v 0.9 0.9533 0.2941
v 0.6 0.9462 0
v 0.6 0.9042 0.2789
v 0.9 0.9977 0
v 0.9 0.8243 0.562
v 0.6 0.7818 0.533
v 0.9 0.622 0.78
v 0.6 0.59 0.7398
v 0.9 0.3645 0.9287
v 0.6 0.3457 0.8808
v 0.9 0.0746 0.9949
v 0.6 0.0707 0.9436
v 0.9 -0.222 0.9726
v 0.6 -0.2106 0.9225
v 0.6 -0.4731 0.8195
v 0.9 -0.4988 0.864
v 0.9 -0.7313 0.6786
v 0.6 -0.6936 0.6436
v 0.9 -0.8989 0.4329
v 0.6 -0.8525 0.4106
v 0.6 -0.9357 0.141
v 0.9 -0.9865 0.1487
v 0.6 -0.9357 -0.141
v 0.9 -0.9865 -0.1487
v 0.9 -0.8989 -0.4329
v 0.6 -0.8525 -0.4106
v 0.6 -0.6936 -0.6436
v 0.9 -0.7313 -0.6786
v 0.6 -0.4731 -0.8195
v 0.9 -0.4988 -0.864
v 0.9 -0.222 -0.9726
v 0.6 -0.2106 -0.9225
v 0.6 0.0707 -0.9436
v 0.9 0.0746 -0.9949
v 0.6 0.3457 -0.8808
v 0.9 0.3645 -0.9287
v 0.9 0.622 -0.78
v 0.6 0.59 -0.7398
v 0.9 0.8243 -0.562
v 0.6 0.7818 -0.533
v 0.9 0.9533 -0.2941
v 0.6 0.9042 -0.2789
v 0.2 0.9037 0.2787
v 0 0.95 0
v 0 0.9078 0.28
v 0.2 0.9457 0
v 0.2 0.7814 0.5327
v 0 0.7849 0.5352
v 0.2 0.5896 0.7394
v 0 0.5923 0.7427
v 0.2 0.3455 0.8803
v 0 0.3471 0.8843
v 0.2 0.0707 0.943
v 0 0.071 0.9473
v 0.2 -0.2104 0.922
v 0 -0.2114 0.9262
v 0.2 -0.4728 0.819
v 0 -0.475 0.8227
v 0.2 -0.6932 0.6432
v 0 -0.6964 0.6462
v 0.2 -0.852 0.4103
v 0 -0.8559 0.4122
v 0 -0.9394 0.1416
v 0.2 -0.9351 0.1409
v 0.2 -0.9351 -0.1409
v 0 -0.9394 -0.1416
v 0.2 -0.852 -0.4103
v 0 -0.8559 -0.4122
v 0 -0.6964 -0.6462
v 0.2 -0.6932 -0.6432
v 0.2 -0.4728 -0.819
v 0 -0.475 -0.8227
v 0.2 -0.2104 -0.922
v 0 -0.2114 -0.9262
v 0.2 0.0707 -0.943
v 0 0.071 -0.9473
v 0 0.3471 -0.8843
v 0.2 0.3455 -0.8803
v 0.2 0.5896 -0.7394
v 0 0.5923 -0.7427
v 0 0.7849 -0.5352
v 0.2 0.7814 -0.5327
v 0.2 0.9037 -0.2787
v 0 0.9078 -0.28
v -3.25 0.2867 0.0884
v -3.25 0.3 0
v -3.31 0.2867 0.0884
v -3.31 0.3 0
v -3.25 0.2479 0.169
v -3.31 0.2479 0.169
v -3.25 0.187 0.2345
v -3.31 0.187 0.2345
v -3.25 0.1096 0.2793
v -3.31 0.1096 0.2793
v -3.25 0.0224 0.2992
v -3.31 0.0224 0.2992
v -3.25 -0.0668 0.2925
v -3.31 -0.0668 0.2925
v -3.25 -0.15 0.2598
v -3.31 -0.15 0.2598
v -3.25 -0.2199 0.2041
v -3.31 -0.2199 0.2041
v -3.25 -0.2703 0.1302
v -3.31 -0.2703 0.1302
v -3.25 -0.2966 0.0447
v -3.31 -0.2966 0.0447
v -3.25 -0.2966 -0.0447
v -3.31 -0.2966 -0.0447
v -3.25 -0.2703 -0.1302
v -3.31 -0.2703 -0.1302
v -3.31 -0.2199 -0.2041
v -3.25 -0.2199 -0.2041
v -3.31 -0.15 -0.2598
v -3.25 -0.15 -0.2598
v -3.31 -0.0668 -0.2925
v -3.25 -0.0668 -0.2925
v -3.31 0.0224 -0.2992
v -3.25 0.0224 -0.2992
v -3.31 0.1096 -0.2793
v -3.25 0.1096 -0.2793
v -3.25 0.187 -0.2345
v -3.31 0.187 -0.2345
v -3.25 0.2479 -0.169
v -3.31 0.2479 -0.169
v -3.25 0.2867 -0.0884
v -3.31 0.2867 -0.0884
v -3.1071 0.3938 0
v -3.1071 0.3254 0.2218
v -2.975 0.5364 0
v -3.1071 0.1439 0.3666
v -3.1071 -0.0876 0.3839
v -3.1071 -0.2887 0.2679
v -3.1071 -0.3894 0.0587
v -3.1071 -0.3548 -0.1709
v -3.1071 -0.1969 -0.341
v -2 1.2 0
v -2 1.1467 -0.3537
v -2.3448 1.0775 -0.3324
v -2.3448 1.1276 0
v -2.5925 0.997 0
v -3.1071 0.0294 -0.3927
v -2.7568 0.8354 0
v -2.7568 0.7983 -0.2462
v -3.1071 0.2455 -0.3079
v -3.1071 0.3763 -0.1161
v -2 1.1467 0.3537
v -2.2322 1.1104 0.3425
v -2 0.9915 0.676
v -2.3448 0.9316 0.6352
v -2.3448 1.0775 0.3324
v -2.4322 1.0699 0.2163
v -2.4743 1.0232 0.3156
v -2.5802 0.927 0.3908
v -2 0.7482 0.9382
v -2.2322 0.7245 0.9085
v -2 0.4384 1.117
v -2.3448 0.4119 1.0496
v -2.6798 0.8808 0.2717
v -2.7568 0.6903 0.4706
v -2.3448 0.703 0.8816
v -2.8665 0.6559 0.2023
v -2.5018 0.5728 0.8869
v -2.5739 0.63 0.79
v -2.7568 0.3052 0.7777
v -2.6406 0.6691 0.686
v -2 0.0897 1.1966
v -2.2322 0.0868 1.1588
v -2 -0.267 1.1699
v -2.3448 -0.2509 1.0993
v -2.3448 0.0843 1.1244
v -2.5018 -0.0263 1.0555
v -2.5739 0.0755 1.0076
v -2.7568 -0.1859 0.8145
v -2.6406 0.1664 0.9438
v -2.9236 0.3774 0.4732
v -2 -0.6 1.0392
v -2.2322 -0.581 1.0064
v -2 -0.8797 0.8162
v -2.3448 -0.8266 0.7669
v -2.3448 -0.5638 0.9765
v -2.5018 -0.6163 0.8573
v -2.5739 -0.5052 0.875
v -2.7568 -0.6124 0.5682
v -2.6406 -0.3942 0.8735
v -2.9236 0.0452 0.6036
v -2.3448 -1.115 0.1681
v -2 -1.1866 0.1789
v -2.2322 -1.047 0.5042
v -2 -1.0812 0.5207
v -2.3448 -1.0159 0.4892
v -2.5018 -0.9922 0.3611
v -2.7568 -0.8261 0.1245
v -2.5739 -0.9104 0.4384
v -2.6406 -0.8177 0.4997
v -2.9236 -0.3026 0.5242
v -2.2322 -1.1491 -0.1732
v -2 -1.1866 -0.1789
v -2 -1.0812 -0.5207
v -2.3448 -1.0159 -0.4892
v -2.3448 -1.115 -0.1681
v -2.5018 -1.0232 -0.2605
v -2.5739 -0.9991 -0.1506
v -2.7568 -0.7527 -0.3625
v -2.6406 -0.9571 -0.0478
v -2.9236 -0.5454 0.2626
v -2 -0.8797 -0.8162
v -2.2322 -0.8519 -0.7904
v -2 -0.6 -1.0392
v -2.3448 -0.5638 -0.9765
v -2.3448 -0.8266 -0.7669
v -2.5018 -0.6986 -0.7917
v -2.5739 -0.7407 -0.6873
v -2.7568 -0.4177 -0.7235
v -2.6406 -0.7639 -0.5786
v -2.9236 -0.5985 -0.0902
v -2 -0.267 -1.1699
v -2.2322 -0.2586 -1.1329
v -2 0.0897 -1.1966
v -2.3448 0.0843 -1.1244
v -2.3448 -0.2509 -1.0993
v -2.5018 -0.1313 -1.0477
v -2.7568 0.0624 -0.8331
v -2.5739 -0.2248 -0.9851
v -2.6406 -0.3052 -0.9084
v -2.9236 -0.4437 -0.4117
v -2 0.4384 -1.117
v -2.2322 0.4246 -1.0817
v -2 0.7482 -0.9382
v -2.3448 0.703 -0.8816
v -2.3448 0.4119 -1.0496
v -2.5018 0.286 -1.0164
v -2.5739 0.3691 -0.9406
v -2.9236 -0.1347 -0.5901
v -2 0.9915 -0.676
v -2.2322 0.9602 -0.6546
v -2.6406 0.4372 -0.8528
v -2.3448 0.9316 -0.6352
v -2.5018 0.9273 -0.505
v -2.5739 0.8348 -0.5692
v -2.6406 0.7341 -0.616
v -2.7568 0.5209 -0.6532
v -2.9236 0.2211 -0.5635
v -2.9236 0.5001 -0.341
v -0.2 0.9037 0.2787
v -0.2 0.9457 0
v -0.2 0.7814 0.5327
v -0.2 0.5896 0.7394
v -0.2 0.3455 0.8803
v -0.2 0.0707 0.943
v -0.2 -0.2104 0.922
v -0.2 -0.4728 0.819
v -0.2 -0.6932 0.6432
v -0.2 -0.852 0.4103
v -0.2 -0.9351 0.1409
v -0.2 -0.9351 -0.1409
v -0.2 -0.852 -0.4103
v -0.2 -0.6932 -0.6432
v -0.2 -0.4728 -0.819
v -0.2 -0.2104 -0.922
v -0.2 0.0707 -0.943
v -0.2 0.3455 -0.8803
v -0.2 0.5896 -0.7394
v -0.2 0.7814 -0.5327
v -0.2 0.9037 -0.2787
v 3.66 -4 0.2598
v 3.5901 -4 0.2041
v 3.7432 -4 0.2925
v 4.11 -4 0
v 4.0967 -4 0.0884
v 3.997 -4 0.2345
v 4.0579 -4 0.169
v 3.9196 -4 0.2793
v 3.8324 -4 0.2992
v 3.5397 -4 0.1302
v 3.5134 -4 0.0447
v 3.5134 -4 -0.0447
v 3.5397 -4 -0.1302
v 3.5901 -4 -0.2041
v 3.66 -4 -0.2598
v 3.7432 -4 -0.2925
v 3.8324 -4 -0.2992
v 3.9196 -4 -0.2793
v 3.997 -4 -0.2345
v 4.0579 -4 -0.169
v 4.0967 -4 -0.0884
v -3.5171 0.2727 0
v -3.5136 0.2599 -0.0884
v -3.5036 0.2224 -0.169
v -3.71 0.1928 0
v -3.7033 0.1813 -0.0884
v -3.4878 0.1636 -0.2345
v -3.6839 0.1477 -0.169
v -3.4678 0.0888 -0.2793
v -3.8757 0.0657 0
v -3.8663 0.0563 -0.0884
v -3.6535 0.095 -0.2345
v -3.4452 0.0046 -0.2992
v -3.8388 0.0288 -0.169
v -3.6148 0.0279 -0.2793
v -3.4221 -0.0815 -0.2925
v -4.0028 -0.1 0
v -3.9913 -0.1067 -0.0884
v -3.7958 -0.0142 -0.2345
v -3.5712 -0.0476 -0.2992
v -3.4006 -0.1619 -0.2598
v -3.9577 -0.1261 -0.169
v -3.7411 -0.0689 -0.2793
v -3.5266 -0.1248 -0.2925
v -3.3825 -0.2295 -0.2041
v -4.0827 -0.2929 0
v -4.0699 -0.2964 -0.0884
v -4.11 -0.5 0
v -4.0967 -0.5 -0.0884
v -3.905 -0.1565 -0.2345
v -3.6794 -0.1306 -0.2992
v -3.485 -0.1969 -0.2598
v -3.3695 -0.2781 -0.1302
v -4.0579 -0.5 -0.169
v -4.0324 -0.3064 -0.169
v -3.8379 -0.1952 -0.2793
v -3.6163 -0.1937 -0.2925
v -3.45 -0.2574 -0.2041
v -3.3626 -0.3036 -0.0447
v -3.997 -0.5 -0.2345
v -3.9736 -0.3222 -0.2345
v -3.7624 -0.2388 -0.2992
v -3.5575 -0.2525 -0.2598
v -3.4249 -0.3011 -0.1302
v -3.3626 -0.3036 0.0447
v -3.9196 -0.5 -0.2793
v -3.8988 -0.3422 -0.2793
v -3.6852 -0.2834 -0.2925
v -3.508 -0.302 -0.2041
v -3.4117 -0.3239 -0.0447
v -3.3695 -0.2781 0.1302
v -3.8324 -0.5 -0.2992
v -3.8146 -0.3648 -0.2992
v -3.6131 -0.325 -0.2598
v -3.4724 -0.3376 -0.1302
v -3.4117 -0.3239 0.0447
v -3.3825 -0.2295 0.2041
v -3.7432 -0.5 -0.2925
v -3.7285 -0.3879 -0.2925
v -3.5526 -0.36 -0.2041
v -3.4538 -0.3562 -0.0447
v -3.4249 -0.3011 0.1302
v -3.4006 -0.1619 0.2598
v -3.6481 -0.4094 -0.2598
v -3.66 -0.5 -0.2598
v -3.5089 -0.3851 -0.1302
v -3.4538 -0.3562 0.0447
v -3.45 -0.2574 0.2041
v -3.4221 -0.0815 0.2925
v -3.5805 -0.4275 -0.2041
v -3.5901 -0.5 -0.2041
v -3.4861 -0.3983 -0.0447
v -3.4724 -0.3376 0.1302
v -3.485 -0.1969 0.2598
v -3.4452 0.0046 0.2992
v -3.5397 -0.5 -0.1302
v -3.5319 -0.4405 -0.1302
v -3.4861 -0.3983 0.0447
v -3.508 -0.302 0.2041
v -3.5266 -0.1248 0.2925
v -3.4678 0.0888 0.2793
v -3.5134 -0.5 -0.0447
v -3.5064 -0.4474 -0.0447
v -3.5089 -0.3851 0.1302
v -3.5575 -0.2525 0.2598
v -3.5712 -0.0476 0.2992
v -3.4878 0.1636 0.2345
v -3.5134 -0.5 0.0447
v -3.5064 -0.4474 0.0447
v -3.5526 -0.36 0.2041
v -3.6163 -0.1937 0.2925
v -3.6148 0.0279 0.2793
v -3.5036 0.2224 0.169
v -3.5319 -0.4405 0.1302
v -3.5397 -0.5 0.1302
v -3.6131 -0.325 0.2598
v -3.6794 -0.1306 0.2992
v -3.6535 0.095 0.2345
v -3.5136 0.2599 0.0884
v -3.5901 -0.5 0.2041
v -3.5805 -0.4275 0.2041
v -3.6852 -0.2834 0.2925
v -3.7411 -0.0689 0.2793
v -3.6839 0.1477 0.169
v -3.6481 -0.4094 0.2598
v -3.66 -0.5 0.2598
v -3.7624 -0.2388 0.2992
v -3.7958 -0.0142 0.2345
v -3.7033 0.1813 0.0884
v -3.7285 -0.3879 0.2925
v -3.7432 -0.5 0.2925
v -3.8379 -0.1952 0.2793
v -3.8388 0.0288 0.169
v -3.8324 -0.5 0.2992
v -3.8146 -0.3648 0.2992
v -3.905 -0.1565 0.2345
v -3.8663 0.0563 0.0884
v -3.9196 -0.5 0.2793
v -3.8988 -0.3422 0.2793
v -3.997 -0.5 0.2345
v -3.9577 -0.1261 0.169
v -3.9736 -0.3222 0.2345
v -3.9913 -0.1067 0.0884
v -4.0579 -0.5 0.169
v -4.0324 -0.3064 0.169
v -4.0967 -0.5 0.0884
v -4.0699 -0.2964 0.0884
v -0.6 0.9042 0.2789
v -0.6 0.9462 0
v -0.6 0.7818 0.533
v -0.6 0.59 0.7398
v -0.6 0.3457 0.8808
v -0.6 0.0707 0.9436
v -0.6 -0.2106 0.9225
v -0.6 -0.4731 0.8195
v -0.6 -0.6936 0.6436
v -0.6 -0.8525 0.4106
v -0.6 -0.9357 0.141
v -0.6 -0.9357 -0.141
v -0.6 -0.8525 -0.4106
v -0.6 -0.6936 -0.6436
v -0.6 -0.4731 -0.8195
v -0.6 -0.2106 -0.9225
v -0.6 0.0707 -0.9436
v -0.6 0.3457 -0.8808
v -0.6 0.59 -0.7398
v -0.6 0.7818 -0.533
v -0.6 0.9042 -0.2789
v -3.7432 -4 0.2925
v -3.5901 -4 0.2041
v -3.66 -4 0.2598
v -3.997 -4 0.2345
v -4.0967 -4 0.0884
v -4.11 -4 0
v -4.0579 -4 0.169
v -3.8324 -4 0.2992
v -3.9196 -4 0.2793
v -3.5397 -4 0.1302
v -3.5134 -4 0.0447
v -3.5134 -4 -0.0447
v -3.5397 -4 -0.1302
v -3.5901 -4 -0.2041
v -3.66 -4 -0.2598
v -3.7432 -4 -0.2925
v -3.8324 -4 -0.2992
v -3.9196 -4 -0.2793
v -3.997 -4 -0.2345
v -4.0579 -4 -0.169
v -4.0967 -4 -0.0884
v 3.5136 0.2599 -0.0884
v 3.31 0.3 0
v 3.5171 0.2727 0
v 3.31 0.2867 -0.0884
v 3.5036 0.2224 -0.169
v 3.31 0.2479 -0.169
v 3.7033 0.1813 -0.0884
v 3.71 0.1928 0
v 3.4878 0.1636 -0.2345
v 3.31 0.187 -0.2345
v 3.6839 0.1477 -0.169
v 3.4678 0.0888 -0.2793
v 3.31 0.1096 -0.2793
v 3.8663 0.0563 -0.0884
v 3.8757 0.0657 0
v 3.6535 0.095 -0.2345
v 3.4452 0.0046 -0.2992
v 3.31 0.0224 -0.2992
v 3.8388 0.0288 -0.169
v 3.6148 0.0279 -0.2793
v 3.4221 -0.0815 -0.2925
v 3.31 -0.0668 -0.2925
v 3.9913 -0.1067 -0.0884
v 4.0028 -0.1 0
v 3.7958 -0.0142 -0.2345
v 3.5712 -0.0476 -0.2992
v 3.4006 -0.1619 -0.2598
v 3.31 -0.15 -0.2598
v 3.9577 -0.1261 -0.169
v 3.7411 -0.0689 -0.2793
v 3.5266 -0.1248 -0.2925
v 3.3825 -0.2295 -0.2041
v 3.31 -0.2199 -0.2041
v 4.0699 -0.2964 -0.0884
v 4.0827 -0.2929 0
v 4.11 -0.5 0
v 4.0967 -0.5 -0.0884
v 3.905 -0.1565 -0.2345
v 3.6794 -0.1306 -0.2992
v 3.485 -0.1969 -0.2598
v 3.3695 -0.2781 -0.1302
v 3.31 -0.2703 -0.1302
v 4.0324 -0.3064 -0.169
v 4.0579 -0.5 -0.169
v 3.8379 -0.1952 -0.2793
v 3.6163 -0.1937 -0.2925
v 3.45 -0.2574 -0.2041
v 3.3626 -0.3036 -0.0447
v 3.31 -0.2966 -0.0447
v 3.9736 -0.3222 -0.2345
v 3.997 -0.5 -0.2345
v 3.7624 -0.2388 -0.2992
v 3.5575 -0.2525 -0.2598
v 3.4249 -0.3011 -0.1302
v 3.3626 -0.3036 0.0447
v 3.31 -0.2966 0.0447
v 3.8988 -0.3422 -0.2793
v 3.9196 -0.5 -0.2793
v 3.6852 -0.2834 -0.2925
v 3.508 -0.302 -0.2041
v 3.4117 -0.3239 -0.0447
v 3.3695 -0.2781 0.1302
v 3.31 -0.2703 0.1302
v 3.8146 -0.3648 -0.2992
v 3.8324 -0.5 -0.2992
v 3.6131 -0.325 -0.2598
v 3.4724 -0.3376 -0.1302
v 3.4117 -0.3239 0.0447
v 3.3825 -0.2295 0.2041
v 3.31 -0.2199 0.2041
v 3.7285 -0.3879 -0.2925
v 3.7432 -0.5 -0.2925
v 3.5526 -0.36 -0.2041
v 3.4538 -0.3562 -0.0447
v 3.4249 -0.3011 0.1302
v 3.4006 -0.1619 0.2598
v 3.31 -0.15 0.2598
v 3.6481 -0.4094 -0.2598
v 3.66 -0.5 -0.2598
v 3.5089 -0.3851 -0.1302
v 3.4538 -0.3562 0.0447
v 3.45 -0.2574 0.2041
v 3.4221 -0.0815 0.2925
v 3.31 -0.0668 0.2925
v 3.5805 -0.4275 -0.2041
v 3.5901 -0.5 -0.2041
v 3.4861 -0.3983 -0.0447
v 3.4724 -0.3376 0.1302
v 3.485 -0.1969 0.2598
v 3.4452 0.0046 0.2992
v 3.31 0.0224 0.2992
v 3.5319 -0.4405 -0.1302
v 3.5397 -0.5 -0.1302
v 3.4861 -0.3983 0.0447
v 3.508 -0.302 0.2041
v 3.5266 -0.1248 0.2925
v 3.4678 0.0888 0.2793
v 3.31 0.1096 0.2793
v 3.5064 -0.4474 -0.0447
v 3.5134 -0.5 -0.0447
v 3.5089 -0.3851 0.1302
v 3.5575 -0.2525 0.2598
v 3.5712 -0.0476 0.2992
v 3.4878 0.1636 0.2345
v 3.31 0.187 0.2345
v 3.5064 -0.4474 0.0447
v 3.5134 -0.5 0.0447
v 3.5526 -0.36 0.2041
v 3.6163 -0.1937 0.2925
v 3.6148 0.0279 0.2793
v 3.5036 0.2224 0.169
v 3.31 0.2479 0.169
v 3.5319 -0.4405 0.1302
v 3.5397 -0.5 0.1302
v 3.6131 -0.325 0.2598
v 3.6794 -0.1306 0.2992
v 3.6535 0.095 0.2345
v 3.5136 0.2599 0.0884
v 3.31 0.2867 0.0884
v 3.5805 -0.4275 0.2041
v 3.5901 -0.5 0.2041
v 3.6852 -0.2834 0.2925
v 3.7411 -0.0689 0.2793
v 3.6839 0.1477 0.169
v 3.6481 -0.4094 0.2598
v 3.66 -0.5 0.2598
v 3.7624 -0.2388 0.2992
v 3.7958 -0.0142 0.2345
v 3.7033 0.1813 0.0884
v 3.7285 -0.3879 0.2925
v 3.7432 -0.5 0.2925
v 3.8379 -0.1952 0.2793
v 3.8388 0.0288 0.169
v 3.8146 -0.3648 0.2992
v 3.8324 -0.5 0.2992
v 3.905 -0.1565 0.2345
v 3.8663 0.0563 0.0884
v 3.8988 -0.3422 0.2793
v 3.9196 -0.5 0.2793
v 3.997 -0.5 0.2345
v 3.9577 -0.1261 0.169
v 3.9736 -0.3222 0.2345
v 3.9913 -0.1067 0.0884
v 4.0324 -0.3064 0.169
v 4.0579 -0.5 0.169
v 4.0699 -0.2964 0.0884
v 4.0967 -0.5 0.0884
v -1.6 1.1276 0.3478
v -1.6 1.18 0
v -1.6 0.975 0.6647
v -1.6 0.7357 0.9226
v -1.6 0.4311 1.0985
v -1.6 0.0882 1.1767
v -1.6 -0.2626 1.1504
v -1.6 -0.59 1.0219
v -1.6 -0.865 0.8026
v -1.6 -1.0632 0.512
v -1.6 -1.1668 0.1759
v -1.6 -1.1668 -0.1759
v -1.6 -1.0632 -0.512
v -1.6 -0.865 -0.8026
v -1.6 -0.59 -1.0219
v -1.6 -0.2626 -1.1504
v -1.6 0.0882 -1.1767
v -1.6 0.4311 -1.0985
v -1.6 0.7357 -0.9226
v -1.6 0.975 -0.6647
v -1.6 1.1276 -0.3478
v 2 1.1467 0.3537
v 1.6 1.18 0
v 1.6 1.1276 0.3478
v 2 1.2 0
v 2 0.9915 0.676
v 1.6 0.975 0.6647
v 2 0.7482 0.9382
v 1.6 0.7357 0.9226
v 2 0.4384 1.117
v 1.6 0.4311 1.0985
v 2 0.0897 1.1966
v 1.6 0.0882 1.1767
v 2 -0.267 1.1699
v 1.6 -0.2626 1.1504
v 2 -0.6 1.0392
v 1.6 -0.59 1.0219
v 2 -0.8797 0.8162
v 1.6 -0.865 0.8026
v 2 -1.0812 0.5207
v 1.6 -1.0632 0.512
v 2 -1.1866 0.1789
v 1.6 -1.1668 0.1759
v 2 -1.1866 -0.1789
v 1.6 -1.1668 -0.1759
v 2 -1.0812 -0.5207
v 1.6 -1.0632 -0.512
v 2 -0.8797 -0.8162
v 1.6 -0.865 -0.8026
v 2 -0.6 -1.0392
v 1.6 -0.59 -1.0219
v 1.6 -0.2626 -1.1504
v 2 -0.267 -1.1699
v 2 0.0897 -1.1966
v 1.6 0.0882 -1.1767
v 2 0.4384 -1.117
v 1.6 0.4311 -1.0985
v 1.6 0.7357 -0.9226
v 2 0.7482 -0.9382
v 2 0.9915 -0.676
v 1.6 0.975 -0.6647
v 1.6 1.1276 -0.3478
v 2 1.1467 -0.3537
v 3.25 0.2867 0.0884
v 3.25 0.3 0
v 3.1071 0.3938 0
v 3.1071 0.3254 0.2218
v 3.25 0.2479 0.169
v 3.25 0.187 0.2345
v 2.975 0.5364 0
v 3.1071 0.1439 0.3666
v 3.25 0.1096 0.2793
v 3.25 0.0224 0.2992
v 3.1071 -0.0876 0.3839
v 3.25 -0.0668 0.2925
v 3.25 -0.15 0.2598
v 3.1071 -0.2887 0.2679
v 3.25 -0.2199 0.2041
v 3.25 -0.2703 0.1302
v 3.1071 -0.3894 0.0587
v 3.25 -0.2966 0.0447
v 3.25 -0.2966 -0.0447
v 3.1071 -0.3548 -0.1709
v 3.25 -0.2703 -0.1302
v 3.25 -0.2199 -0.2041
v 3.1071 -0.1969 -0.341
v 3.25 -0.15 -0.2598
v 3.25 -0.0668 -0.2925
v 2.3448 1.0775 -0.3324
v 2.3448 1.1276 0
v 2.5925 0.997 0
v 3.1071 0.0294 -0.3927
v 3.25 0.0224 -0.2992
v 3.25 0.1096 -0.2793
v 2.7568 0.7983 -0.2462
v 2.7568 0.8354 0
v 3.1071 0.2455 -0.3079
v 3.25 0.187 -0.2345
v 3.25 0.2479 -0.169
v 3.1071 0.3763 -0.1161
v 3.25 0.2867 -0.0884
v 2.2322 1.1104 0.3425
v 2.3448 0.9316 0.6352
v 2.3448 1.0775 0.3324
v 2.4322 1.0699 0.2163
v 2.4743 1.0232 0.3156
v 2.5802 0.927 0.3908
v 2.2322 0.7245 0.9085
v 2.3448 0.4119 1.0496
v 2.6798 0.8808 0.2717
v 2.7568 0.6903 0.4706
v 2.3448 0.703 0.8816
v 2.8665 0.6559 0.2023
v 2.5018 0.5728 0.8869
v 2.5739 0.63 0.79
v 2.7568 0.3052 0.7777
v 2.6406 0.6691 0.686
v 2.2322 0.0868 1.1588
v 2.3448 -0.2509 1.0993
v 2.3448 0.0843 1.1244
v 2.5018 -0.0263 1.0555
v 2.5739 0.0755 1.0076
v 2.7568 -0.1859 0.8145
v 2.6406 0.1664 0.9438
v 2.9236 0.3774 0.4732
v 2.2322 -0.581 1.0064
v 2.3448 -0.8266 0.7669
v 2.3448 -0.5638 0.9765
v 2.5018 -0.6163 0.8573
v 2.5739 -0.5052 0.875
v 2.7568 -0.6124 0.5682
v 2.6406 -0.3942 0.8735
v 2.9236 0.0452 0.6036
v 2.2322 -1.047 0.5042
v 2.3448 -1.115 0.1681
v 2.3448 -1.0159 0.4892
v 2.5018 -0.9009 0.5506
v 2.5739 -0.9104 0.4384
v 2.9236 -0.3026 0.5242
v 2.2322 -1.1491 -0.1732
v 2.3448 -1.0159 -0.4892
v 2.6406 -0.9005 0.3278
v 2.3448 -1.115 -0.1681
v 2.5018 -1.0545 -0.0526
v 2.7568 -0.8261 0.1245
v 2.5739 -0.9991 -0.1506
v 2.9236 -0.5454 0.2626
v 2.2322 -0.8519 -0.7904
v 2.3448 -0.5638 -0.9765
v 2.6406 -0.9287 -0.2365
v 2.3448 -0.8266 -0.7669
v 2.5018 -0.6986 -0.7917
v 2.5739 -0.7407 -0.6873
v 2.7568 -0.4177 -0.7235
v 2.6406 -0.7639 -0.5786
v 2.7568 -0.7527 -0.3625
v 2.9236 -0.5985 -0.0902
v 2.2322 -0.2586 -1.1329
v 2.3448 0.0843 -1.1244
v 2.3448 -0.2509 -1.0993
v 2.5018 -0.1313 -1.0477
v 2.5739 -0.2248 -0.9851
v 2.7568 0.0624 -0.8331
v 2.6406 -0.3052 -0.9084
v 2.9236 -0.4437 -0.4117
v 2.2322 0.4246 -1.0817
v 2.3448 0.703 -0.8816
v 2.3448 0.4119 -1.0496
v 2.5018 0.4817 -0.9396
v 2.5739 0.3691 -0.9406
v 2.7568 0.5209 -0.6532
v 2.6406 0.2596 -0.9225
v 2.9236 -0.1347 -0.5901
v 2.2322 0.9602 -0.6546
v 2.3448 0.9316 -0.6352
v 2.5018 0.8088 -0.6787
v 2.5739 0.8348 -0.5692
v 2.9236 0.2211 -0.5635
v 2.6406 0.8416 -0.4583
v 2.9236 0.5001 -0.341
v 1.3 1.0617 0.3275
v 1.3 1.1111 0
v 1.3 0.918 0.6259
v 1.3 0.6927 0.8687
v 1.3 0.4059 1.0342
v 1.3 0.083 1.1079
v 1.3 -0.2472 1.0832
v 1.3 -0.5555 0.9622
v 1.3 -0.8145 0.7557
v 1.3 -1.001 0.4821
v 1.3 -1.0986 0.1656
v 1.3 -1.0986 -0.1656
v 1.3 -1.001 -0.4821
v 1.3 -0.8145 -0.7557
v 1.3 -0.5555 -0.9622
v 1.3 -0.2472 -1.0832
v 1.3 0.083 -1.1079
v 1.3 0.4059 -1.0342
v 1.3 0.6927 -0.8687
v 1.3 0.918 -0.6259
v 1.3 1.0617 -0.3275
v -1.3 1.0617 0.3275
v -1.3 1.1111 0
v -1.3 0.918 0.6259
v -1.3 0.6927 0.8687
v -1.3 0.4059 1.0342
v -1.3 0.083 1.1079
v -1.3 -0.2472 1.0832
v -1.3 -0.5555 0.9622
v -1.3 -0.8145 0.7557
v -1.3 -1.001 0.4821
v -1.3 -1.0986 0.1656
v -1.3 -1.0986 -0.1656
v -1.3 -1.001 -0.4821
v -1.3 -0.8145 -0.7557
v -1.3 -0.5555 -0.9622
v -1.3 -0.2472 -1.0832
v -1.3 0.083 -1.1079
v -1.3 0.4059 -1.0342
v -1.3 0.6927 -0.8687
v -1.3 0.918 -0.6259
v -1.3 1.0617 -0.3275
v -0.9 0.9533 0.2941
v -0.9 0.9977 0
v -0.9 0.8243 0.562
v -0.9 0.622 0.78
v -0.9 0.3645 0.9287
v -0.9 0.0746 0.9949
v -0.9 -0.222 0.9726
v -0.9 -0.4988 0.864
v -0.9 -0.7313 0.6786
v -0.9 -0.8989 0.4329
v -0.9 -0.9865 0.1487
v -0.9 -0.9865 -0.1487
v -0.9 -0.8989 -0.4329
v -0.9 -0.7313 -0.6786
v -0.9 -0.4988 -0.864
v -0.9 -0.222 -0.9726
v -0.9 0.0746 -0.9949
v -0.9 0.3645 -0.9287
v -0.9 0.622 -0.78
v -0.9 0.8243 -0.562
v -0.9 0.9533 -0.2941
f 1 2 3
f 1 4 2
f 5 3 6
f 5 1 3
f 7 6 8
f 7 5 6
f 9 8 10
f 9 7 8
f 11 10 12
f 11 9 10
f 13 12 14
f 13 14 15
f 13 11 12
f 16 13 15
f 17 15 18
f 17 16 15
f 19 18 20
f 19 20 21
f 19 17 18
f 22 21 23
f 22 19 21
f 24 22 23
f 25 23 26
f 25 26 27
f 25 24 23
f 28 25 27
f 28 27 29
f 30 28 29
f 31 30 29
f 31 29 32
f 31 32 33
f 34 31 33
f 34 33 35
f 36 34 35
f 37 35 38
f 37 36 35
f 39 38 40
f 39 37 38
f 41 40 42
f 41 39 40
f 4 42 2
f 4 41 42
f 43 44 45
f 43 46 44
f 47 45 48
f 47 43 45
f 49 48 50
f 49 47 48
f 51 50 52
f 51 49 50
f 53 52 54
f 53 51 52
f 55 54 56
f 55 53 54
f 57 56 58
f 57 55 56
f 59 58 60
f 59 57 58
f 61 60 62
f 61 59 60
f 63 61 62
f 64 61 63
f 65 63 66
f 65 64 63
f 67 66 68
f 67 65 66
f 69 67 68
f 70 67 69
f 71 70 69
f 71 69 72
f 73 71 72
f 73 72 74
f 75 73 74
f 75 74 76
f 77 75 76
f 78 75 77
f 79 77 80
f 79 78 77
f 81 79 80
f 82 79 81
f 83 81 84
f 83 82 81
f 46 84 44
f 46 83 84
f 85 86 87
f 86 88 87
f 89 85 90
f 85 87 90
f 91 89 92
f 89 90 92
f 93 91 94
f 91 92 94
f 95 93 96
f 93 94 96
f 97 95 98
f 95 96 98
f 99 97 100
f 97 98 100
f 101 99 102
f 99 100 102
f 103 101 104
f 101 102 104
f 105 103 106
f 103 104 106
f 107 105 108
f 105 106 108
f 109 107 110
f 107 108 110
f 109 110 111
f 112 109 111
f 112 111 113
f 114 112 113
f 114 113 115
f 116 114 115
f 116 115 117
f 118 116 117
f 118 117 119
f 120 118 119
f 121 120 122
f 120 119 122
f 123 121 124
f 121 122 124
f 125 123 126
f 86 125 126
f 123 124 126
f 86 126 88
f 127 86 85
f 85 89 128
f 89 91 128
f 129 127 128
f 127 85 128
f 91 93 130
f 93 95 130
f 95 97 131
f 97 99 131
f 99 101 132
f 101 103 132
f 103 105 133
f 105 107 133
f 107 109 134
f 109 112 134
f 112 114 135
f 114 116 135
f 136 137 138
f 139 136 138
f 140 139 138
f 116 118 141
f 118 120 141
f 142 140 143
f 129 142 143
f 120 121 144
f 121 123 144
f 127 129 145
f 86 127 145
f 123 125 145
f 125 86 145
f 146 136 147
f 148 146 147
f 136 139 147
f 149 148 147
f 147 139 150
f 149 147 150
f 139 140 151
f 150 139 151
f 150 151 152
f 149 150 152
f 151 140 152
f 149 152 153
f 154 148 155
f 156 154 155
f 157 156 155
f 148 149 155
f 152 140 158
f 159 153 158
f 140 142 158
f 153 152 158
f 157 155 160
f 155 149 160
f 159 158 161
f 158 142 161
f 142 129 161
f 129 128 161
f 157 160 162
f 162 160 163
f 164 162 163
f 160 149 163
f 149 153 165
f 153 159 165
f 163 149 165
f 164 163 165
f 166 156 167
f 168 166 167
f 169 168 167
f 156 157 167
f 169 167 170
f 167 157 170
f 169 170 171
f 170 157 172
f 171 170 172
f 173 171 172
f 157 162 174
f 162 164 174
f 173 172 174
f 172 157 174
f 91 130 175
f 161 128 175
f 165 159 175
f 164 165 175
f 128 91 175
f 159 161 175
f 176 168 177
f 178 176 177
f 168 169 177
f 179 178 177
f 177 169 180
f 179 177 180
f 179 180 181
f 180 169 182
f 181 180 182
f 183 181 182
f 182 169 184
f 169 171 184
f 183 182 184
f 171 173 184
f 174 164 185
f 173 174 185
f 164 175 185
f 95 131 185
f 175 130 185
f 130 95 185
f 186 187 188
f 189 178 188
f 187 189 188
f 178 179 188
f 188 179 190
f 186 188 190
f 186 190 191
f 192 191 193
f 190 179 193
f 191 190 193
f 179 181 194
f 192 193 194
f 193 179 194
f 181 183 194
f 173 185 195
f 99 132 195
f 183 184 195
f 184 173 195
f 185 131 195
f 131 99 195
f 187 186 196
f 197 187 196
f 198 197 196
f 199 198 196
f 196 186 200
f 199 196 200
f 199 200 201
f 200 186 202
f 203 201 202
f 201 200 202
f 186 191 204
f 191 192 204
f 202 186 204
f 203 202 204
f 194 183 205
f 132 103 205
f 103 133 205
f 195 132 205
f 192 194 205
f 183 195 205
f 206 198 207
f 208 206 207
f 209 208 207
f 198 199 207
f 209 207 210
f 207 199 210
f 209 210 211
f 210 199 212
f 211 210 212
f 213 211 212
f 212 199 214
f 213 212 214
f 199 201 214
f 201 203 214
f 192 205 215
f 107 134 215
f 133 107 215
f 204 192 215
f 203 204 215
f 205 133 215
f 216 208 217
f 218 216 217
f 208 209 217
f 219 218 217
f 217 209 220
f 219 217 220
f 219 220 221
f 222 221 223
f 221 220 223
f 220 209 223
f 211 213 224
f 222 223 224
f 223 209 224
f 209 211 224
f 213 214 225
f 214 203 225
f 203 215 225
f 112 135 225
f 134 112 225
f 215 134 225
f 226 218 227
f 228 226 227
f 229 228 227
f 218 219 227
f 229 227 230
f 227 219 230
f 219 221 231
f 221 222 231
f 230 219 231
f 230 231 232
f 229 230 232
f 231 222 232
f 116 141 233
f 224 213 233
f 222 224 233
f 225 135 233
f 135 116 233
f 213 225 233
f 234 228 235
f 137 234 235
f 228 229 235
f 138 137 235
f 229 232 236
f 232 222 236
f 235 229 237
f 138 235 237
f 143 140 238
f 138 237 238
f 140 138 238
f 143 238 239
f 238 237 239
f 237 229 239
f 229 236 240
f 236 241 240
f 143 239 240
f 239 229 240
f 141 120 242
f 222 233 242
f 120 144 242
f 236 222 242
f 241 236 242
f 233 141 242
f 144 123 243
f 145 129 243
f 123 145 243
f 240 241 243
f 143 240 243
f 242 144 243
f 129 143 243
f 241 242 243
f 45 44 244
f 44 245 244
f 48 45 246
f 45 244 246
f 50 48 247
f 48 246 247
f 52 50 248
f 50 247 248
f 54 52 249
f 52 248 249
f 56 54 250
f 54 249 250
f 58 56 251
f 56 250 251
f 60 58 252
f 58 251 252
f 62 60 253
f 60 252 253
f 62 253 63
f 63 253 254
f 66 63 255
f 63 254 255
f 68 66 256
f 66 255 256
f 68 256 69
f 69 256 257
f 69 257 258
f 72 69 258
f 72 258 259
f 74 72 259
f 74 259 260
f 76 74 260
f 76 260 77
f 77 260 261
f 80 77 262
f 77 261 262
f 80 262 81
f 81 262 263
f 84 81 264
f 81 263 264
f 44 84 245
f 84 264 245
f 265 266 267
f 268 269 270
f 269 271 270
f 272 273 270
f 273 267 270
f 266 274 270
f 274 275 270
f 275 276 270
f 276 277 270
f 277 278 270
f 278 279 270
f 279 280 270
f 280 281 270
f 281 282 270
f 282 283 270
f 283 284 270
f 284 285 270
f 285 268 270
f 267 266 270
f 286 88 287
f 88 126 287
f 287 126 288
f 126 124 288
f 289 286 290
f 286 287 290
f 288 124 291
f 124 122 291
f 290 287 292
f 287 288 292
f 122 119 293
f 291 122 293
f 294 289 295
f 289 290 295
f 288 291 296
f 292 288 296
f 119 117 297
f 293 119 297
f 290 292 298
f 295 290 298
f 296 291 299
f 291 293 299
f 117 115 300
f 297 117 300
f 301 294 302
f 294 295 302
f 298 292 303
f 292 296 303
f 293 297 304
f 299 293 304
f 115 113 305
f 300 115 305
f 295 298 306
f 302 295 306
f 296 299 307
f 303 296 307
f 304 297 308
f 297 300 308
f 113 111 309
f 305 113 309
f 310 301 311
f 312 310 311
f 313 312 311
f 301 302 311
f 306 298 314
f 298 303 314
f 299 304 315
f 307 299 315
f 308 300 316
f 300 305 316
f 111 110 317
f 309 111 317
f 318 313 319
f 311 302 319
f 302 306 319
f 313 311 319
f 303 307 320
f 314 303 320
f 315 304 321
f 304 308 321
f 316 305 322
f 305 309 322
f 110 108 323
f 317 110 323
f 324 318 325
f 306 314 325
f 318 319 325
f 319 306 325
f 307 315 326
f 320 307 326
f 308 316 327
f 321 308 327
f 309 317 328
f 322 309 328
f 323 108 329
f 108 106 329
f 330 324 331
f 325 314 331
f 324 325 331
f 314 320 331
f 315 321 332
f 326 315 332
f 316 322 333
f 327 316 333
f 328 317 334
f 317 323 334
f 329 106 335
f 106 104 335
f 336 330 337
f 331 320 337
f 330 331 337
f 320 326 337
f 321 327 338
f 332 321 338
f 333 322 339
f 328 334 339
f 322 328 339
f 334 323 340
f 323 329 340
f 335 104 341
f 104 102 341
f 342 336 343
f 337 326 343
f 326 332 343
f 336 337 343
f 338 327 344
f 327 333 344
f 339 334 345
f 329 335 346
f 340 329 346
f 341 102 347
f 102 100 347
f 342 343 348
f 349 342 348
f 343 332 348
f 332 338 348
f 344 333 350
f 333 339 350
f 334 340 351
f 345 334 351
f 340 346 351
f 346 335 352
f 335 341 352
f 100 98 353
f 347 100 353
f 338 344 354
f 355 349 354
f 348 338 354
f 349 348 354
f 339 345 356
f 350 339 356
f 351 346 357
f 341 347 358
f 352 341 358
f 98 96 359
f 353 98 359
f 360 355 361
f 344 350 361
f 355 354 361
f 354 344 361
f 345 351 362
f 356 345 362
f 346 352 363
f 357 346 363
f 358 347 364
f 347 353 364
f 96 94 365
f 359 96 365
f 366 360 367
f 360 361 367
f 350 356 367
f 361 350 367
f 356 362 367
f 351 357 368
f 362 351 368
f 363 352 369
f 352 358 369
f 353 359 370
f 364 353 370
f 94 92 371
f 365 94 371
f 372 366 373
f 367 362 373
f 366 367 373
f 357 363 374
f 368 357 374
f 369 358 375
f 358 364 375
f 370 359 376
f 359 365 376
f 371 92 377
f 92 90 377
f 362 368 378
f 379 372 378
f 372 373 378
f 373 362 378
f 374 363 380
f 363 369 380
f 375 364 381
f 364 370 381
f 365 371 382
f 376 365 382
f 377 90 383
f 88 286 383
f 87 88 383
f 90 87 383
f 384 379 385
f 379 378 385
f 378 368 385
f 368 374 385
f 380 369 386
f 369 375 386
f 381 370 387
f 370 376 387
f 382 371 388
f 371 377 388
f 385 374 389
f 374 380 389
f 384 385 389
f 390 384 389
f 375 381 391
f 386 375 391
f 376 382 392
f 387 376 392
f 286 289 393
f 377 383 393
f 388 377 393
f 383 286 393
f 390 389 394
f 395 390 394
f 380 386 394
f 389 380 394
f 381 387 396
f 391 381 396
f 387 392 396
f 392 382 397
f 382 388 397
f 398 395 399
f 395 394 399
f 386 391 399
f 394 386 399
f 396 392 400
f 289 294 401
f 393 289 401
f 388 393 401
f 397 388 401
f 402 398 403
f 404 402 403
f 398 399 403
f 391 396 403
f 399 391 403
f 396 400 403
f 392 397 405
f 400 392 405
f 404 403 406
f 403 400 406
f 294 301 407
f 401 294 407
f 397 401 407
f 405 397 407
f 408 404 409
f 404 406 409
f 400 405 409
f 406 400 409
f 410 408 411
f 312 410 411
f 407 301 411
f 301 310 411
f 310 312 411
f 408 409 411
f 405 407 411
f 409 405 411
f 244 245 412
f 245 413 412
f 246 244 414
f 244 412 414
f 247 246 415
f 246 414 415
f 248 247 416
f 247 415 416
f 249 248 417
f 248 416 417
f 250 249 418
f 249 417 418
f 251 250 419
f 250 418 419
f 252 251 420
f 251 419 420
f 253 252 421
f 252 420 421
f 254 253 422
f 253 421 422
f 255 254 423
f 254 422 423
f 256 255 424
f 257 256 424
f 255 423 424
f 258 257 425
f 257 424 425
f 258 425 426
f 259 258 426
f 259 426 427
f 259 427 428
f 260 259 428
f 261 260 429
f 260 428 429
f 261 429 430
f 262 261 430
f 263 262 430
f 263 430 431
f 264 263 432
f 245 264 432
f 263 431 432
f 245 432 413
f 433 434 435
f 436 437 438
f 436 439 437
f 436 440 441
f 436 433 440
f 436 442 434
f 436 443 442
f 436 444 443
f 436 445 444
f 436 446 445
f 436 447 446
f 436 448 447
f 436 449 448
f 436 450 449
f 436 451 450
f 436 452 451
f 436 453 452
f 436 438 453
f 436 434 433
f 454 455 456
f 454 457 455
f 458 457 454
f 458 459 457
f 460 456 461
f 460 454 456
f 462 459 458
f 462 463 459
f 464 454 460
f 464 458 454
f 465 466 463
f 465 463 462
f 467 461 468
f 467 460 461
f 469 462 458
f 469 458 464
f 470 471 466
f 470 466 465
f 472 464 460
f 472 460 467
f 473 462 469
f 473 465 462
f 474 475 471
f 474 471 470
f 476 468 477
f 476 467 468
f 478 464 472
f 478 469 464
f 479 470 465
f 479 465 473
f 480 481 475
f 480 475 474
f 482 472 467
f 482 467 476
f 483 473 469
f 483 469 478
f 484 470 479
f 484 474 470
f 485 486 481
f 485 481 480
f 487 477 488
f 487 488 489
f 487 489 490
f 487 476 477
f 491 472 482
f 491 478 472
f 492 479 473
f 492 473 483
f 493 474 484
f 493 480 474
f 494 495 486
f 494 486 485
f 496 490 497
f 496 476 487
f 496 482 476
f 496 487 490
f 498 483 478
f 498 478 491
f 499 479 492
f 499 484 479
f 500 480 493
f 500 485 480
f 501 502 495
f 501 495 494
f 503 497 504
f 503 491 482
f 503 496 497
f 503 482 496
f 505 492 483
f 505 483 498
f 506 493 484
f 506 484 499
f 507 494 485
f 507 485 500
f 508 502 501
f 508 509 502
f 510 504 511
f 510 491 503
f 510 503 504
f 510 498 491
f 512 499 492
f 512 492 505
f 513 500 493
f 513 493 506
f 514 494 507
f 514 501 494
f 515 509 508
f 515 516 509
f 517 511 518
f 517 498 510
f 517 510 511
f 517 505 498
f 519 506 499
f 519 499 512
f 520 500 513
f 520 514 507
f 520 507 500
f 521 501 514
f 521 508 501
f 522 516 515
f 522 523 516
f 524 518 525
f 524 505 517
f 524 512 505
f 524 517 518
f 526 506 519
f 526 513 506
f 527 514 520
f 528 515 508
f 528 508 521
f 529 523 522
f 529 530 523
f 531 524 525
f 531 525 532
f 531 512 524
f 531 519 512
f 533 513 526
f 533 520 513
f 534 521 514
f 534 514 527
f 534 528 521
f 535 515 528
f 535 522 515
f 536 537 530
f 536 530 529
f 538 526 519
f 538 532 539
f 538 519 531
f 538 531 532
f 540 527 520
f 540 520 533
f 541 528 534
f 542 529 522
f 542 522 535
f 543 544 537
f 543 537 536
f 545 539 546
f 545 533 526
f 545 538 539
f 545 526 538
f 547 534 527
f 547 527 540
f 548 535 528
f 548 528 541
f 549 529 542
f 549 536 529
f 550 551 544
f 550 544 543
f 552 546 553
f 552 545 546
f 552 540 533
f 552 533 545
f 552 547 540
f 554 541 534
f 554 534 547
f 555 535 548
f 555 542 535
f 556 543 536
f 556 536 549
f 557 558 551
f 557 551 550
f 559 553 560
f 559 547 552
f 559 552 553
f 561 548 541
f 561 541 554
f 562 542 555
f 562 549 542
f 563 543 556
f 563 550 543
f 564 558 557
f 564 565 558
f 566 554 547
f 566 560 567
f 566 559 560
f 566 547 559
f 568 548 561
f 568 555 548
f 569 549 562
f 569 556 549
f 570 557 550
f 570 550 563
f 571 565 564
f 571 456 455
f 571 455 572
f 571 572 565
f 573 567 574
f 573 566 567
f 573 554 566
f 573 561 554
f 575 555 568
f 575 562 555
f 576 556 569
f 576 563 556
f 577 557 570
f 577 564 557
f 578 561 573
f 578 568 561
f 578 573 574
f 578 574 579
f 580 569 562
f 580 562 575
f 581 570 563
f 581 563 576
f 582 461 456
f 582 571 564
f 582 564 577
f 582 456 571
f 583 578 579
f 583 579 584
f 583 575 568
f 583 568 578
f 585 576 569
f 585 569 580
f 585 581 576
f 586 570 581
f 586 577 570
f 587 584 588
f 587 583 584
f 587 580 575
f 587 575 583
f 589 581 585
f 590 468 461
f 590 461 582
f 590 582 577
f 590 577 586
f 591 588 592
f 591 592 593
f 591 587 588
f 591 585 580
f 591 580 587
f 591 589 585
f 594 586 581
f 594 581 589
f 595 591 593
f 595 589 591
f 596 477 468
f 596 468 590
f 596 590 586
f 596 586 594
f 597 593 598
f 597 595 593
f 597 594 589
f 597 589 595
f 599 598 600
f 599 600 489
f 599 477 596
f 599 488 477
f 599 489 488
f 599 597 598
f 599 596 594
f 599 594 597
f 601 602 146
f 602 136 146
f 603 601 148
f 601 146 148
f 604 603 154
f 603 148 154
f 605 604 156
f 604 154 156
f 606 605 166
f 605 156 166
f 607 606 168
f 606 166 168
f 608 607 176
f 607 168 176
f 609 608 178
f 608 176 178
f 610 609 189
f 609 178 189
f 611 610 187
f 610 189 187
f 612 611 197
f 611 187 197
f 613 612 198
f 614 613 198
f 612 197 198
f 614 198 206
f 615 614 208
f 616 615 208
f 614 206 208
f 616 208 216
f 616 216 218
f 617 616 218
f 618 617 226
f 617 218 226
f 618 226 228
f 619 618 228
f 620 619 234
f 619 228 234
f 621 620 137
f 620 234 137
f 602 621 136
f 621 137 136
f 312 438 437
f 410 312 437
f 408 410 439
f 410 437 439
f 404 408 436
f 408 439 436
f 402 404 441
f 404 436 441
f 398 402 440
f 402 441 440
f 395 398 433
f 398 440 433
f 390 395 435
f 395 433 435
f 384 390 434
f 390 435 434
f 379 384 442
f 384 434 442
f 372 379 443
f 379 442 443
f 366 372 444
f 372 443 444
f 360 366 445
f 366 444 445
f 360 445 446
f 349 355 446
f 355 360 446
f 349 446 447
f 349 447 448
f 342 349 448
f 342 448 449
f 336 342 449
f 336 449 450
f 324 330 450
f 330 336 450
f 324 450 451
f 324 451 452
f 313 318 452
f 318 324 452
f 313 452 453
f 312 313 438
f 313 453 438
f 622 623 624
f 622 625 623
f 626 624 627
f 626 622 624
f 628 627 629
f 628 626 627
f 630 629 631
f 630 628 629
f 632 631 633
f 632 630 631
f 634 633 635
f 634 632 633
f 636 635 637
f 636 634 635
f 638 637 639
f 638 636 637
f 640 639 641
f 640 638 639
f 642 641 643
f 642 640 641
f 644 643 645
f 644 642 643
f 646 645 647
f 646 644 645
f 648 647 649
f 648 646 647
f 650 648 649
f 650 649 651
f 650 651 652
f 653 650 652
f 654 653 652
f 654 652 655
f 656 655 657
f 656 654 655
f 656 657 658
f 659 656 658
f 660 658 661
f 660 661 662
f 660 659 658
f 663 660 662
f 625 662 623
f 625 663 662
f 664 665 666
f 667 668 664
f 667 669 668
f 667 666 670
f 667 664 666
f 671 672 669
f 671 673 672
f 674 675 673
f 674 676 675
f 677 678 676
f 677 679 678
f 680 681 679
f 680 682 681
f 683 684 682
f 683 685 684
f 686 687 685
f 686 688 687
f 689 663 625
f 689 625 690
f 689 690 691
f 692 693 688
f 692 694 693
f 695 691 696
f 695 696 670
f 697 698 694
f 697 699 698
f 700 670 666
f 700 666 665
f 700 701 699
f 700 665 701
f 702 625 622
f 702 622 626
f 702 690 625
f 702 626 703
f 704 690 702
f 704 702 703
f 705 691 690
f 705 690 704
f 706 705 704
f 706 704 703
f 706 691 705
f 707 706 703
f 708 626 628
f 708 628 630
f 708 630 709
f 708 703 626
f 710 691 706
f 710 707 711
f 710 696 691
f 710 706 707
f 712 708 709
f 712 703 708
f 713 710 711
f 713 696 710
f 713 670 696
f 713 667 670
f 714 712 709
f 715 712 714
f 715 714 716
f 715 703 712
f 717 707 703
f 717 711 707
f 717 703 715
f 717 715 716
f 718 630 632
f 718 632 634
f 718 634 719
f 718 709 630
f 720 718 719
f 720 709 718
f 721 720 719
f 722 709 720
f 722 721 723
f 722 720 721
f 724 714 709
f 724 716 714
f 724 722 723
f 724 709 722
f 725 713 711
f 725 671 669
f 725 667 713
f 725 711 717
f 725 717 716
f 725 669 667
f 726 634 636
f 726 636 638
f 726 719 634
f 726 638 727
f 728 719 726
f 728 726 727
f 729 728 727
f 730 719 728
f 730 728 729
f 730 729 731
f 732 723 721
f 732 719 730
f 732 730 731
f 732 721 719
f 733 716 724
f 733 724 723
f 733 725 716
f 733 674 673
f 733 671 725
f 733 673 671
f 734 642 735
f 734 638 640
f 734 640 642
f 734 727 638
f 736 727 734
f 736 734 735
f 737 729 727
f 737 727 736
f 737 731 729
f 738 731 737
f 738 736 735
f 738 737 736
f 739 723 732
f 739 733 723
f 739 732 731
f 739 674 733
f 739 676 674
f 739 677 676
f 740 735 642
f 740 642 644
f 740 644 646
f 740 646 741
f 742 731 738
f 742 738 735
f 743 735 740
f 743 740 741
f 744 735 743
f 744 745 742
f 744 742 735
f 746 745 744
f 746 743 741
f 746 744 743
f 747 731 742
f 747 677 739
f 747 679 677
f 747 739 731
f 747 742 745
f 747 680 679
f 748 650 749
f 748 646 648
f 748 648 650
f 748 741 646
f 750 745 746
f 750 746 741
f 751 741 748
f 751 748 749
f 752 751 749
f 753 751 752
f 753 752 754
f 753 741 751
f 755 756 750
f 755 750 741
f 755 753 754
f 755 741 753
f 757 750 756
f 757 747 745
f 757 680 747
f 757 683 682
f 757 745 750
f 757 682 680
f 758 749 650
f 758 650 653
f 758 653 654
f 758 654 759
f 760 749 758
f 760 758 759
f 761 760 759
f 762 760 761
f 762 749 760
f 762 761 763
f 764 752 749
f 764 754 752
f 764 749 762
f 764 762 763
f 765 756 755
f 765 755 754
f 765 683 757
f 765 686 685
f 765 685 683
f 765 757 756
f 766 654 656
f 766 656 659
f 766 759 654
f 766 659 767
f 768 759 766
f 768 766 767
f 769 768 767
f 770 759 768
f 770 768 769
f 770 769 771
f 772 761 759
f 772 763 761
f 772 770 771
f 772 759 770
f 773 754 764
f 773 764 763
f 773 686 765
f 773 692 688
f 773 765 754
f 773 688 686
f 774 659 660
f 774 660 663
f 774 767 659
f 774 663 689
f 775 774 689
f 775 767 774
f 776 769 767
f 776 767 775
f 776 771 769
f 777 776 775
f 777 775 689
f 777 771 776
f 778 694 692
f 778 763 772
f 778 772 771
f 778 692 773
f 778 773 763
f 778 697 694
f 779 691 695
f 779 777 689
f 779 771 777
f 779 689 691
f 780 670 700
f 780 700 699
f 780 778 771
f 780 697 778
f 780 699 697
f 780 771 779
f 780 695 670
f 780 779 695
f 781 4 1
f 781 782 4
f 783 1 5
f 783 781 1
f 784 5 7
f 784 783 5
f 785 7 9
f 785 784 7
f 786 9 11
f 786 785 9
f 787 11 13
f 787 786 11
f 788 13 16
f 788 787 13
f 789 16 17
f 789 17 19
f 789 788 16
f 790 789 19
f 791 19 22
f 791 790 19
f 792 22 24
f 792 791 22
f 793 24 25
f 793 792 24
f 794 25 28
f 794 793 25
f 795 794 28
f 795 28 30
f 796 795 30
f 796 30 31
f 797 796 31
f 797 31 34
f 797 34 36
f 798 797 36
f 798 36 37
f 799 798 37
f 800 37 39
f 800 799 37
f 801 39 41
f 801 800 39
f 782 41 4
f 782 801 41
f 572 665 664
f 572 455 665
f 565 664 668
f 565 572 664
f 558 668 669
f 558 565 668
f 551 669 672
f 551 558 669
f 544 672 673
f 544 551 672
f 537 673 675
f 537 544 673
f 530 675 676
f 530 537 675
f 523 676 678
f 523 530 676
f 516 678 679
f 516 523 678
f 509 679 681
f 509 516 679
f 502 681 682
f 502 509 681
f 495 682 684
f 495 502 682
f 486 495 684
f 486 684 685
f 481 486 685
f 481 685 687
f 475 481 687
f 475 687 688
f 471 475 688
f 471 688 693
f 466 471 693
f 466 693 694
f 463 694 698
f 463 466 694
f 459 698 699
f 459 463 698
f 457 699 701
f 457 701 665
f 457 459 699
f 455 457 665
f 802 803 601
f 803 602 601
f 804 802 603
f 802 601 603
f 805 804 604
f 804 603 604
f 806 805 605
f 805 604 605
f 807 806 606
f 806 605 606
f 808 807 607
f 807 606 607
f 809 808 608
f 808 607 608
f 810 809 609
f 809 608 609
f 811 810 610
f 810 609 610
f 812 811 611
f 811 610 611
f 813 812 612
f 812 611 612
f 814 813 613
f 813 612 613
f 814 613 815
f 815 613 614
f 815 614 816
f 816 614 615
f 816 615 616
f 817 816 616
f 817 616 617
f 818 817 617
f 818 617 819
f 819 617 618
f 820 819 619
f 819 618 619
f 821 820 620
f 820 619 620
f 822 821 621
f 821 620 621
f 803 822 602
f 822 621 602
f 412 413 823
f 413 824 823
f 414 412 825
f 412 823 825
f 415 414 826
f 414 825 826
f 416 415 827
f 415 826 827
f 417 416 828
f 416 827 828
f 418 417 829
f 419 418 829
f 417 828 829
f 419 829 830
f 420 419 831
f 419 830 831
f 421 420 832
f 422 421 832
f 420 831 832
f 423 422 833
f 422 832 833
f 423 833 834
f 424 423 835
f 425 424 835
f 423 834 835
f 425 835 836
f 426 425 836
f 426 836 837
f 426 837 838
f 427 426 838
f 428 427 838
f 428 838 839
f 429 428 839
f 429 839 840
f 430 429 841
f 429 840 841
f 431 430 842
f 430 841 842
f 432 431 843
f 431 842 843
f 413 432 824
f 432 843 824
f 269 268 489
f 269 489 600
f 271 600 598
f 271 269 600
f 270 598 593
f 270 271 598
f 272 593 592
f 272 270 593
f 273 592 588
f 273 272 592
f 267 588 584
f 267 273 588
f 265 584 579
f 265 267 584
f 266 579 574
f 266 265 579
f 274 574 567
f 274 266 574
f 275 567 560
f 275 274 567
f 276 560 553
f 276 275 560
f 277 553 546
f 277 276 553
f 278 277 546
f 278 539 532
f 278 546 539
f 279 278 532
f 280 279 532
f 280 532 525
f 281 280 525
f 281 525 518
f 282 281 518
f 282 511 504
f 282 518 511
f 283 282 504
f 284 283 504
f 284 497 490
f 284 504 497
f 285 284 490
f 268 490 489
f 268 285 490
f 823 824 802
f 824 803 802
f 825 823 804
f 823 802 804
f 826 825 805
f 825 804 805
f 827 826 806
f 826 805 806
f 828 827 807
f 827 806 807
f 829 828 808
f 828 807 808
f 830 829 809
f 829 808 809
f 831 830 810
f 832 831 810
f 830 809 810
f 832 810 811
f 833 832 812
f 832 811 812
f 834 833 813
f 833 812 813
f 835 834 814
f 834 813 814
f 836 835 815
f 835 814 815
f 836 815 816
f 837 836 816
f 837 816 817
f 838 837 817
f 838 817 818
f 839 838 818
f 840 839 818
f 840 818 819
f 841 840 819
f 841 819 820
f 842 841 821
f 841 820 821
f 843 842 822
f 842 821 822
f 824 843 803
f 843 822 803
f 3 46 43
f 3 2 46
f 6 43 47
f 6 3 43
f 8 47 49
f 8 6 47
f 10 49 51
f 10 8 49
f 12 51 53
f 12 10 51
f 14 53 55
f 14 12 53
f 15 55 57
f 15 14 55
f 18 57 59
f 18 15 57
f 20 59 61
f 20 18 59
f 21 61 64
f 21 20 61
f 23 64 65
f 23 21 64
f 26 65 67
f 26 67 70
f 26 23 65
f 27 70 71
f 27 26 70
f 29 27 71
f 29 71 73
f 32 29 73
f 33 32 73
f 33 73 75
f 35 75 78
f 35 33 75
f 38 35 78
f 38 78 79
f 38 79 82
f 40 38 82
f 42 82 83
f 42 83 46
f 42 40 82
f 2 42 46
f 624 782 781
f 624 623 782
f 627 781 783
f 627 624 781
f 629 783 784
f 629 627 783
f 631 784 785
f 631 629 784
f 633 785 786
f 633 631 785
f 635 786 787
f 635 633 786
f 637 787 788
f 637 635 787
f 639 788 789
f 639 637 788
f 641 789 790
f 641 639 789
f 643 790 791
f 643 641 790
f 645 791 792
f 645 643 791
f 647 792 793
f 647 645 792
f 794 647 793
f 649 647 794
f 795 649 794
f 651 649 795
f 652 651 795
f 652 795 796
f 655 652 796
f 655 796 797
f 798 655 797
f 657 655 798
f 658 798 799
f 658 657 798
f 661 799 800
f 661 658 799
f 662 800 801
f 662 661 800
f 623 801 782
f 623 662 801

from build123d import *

# Parameters (mm, degrees)
SKETCH_5_R = 0.3


with BuildPart() as part:
    # Эскиз3 → Повернуть2 (revolve)
    with BuildSketch(Plane.XY):
        with BuildLine():
            Line((0, 0), (-3.25, 0))
            Line((-3.25, 0), (-3.25, 0.3))
            add(Edge.make_bspline(
                [(-2.000000082, 1.199999952), (-2.23604302, 1.181615986), (-2.789263679, 1.00505202), (-2.971144892, 0.430097598), (-3.25, 0.3)],
                knots=[0.780397484, 0.780397484, 0.780397484, 0.780397484, 0.876745066, 1, 1, 1, 1], degree=3))
            add(Edge.make_bspline(
                [(-1.6, 1.180025241), (-1.731399218, 1.201650855), (-1.864601443, 1.21054538), (-2.000000082, 1.199999952)],
                knots=[0.725130753, 0.725130753, 0.725130753, 0.725130753, 0.780397484, 0.780397484, 0.780397484, 0.780397484], degree=3))
            add(Edge.make_bspline(
                [(-1.3, 1.111050082), (-1.34982276, 1.125028982), (-1.449295193, 1.15139314), (-1.549743584, 1.171754066), (-1.6, 1.180025241)],
                knots=[0.682659096, 0.682659096, 0.682659096, 0.682659096, 0.70399282, 0.725130753, 0.725130753, 0.725130753, 0.725130753], degree=3))
            add(Edge.make_bspline(
                [(-0.9, 0.997661651), (-1.033638838, 1.030728014), (-1.166305516, 1.073539075), (-1.3, 1.111050082)],
                knots=[0.62541214, 0.62541214, 0.62541214, 0.62541214, 0.682659096, 0.682659096, 0.682659096, 0.682659096], degree=3))
            add(Edge.make_bspline(
                [(-0.6, 0.946228082), (-0.616698211, 0.947554212), (-0.71755748, 0.957111909), (-0.817198443, 0.977173996), (-0.9, 0.997661651)],
                knots=[0.582920397, 0.582920397, 0.582920397, 0.582920397, 0.589942383, 0.62541214, 0.62541214, 0.62541214, 0.62541214], degree=3))
            add(Edge.make_bspline(
                [(-0.2, 0.945686937), (-0.334396136, 0.941079864), (-0.468154451, 0.935757238), (-0.6, 0.946228082)],
                knots=[0.527476276, 0.527476276, 0.527476276, 0.527476276, 0.582920397, 0.582920397, 0.582920397, 0.582920397], degree=3))
            add(Edge.make_bspline(
                [(0, 0.95), (-0.066719861, 0.950074874), (-0.133438155, 0.947968664), (-0.2, 0.945686937)],
                knots=[0.500016684, 0.500016684, 0.500016684, 0.500016684, 0.527476276, 0.527476276, 0.527476276, 0.527476276], degree=3))
            add(Edge.make_bspline(
                [(0, 0.95), (0.066719861, 0.950074874), (0.133438155, 0.947968664), (0.2, 0.945686937)],
                knots=[0.500016684, 0.500016684, 0.500016684, 0.500016684, 0.527476276, 0.527476276, 0.527476276, 0.527476276], degree=3))
            add(Edge.make_bspline(
                [(0.2, 0.945686937), (0.334396136, 0.941079864), (0.468154451, 0.935757238), (0.6, 0.946228082)],
                knots=[0.527476276, 0.527476276, 0.527476276, 0.527476276, 0.582920397, 0.582920397, 0.582920397, 0.582920397], degree=3))
            add(Edge.make_bspline(
                [(0.6, 0.946228082), (0.616698211, 0.947554212), (0.71755748, 0.957111909), (0.817198443, 0.977173996), (0.9, 0.997661651)],
                knots=[0.582920397, 0.582920397, 0.582920397, 0.582920397, 0.589942383, 0.62541214, 0.62541214, 0.62541214, 0.62541214], degree=3))
            add(Edge.make_bspline(
                [(0.9, 0.997661651), (1.033638838, 1.030728014), (1.166305516, 1.073539075), (1.3, 1.111050082)],
                knots=[0.62541214, 0.62541214, 0.62541214, 0.62541214, 0.682659096, 0.682659096, 0.682659096, 0.682659096], degree=3))
            add(Edge.make_bspline(
                [(1.3, 1.111050082), (1.34982276, 1.125028982), (1.449295193, 1.15139314), (1.549743584, 1.171754066), (1.6, 1.180025241)],
                knots=[0.682659096, 0.682659096, 0.682659096, 0.682659096, 0.70399282, 0.725130753, 0.725130753, 0.725130753, 0.725130753], degree=3))
            add(Edge.make_bspline(
                [(1.6, 1.180025241), (1.731399218, 1.201650855), (1.864601443, 1.21054538), (2, 1.2)],
                knots=[0.725130753, 0.725130753, 0.725130753, 0.725130753, 0.780397484, 0.780397484, 0.780397484, 0.780397484], degree=3))
            add(Edge.make_bspline(
                [(2, 1.2), (2.23604302, 1.181615986), (2.789263679, 1.00505202), (2.971144892, 0.430097598), (3.25, 0.3)],
                knots=[0.780397484, 0.780397484, 0.780397484, 0.780397484, 0.876745066, 1, 1, 1, 1], degree=3))
            Line((3.25, 0.3), (3.25, 0))
            Line((3.25, 0), (0, 0))
        make_face()
    revolve(axis=Axis((0, 0, 0), (1, 0, 0)))

    # По траектории2: sweep along a path in Эскиз4
    with BuildLine(Plane.XY) as sweep_2_path:
        Line((2.987274619, 0), (3.31, 0))
        ThreePointArc((3.31, 0), (3.663553391, -0.146446609), (3.81, -0.5))
        Line((3.81, -0.5), (3.81, -4))
    # Эскиз5 → По траектории2 (sweep)
    with BuildSketch(Plane(origin=(0, -4, 0), x_dir=(1, 0, 0), z_dir=(0, 1, 0))):
        with Locations((3.81, 0)):
            Circle(SKETCH_5_R)
    sweep_2 = sweep(path=sweep_2_path.line)

    # Зеркальное отражение1: По траектории2 across plane
    add(sweep_2.mirror(Plane(origin=(0, 0, 0), x_dir=(0, 0, 1), z_dir=(1, 0, 0))))


solid = part.part
